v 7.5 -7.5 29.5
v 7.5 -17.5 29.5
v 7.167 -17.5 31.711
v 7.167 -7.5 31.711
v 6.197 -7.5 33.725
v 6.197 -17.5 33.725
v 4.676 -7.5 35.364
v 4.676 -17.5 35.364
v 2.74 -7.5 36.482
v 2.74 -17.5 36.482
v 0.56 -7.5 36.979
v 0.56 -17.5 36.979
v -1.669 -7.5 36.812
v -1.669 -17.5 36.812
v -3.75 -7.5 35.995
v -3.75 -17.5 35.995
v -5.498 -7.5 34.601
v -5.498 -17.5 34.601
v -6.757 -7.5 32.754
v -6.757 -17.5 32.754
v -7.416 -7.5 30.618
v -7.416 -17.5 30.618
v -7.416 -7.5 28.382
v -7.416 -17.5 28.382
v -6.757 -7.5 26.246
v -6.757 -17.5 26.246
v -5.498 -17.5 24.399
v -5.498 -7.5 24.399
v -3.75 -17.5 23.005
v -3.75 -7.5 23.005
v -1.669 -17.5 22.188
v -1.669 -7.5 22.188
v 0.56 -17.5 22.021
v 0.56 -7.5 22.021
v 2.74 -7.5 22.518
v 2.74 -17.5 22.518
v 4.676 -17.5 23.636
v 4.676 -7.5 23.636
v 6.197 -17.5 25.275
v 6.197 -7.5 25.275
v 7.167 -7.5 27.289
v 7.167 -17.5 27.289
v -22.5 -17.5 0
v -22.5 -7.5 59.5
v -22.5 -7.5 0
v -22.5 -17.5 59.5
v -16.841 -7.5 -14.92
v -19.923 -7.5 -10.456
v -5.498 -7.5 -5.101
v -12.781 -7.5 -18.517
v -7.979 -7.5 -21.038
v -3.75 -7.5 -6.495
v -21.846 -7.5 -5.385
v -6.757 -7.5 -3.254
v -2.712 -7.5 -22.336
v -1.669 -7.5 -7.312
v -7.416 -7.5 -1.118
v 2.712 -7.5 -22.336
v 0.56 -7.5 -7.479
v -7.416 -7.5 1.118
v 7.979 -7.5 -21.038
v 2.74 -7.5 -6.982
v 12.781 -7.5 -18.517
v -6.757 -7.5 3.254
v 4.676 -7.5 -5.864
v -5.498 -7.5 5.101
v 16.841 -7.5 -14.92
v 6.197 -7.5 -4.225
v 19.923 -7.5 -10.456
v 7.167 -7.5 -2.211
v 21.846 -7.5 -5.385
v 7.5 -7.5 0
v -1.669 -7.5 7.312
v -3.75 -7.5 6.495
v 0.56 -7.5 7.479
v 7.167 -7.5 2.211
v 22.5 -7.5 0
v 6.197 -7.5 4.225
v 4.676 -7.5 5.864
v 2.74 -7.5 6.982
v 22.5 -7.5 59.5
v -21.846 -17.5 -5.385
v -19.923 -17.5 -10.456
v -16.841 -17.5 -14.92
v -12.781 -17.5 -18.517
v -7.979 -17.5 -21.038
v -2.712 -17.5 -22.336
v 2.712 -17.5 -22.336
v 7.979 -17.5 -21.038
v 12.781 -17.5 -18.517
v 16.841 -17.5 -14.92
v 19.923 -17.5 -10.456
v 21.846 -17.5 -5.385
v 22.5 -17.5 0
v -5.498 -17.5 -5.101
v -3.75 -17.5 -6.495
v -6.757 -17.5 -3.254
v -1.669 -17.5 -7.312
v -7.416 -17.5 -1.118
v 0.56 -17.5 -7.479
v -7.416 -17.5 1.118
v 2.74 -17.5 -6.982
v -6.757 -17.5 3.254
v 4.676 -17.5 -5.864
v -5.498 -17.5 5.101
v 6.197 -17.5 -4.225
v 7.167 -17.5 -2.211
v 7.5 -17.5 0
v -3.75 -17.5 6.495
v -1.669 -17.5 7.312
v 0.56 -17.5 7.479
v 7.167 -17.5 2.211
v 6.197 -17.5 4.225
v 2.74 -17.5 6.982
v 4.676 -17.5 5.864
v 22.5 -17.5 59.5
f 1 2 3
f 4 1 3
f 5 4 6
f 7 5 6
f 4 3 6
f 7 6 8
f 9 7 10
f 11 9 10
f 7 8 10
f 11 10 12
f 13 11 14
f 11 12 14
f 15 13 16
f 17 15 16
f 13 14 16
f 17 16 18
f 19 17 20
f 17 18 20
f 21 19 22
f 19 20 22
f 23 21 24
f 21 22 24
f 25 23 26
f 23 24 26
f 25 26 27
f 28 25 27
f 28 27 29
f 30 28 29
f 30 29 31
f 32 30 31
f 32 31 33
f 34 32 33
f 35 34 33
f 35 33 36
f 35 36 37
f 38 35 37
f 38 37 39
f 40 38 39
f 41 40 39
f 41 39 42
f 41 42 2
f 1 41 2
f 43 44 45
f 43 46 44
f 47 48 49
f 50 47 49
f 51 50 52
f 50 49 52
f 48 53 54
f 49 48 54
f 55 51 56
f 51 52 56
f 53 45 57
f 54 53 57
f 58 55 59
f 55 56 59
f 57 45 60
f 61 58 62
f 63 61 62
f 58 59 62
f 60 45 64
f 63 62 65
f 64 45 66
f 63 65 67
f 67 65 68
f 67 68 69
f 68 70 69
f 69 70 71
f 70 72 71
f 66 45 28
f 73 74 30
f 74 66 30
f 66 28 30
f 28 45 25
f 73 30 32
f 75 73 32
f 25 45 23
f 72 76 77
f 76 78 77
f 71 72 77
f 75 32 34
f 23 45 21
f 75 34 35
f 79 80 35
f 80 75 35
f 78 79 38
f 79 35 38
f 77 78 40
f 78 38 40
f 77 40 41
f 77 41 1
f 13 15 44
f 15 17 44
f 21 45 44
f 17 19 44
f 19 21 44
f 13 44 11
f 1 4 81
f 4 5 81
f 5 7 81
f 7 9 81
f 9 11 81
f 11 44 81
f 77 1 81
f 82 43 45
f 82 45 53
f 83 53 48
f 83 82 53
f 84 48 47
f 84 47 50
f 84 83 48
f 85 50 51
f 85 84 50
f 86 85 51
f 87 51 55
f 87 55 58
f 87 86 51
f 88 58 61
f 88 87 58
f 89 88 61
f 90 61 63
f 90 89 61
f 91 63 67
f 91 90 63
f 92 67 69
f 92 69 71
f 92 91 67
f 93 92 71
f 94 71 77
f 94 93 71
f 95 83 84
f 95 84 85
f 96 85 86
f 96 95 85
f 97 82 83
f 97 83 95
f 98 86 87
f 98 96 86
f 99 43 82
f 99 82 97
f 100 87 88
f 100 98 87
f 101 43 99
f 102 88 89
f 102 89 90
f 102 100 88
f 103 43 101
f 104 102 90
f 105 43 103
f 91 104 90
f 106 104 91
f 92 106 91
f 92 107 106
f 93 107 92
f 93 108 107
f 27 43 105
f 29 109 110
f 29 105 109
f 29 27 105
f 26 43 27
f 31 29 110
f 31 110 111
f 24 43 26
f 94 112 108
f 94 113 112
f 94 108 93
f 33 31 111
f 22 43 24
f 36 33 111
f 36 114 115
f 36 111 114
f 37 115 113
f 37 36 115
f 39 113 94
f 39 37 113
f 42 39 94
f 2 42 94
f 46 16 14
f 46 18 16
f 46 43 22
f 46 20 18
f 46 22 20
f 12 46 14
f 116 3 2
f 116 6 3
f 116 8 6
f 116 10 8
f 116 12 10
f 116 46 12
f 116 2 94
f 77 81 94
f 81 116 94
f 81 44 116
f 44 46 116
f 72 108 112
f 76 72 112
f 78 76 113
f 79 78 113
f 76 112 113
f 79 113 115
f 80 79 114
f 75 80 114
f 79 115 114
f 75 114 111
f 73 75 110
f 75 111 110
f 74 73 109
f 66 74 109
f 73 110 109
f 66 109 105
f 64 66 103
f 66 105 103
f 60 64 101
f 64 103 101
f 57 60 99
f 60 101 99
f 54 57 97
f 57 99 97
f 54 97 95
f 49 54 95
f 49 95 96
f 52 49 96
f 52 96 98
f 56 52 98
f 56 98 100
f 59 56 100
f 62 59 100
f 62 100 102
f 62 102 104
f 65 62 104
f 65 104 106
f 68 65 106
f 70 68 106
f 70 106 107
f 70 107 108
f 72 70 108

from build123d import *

# Parameters (mm, degrees)
PAD_DEPTH  = 5
SKETCH_R   = 7.5
HOLE_DEPTH = 10.001


with BuildPart() as part:
    # Sketch004 → Pad (new body, symmetric)
    with BuildSketch(Plane.XZ.offset(12.5)):
        with BuildLine():
            Line((-22.5, 59.5), (-22.5, -6e-05))
            ThreePointArc((-22.5, -6e-05), (0, -22.5), (22.5, -6e-05))
            Line((22.5, 59.5), (22.5, -6e-05))
            Line((-22.5, 59.5), (22.5, 59.5))
        make_face()
    extrude(amount=PAD_DEPTH, both=True)

    # Sketch (on Face6 of Pad) → Hole (cut, through all)
    with BuildSketch(Plane.XZ.offset(17.5)):
        Circle(SKETCH_R)
        with Locations((0, 29.5)):
            Circle(SKETCH_R)
    extrude(amount=-HOLE_DEPTH, mode=Mode.SUBTRACT)


solid = part.part
